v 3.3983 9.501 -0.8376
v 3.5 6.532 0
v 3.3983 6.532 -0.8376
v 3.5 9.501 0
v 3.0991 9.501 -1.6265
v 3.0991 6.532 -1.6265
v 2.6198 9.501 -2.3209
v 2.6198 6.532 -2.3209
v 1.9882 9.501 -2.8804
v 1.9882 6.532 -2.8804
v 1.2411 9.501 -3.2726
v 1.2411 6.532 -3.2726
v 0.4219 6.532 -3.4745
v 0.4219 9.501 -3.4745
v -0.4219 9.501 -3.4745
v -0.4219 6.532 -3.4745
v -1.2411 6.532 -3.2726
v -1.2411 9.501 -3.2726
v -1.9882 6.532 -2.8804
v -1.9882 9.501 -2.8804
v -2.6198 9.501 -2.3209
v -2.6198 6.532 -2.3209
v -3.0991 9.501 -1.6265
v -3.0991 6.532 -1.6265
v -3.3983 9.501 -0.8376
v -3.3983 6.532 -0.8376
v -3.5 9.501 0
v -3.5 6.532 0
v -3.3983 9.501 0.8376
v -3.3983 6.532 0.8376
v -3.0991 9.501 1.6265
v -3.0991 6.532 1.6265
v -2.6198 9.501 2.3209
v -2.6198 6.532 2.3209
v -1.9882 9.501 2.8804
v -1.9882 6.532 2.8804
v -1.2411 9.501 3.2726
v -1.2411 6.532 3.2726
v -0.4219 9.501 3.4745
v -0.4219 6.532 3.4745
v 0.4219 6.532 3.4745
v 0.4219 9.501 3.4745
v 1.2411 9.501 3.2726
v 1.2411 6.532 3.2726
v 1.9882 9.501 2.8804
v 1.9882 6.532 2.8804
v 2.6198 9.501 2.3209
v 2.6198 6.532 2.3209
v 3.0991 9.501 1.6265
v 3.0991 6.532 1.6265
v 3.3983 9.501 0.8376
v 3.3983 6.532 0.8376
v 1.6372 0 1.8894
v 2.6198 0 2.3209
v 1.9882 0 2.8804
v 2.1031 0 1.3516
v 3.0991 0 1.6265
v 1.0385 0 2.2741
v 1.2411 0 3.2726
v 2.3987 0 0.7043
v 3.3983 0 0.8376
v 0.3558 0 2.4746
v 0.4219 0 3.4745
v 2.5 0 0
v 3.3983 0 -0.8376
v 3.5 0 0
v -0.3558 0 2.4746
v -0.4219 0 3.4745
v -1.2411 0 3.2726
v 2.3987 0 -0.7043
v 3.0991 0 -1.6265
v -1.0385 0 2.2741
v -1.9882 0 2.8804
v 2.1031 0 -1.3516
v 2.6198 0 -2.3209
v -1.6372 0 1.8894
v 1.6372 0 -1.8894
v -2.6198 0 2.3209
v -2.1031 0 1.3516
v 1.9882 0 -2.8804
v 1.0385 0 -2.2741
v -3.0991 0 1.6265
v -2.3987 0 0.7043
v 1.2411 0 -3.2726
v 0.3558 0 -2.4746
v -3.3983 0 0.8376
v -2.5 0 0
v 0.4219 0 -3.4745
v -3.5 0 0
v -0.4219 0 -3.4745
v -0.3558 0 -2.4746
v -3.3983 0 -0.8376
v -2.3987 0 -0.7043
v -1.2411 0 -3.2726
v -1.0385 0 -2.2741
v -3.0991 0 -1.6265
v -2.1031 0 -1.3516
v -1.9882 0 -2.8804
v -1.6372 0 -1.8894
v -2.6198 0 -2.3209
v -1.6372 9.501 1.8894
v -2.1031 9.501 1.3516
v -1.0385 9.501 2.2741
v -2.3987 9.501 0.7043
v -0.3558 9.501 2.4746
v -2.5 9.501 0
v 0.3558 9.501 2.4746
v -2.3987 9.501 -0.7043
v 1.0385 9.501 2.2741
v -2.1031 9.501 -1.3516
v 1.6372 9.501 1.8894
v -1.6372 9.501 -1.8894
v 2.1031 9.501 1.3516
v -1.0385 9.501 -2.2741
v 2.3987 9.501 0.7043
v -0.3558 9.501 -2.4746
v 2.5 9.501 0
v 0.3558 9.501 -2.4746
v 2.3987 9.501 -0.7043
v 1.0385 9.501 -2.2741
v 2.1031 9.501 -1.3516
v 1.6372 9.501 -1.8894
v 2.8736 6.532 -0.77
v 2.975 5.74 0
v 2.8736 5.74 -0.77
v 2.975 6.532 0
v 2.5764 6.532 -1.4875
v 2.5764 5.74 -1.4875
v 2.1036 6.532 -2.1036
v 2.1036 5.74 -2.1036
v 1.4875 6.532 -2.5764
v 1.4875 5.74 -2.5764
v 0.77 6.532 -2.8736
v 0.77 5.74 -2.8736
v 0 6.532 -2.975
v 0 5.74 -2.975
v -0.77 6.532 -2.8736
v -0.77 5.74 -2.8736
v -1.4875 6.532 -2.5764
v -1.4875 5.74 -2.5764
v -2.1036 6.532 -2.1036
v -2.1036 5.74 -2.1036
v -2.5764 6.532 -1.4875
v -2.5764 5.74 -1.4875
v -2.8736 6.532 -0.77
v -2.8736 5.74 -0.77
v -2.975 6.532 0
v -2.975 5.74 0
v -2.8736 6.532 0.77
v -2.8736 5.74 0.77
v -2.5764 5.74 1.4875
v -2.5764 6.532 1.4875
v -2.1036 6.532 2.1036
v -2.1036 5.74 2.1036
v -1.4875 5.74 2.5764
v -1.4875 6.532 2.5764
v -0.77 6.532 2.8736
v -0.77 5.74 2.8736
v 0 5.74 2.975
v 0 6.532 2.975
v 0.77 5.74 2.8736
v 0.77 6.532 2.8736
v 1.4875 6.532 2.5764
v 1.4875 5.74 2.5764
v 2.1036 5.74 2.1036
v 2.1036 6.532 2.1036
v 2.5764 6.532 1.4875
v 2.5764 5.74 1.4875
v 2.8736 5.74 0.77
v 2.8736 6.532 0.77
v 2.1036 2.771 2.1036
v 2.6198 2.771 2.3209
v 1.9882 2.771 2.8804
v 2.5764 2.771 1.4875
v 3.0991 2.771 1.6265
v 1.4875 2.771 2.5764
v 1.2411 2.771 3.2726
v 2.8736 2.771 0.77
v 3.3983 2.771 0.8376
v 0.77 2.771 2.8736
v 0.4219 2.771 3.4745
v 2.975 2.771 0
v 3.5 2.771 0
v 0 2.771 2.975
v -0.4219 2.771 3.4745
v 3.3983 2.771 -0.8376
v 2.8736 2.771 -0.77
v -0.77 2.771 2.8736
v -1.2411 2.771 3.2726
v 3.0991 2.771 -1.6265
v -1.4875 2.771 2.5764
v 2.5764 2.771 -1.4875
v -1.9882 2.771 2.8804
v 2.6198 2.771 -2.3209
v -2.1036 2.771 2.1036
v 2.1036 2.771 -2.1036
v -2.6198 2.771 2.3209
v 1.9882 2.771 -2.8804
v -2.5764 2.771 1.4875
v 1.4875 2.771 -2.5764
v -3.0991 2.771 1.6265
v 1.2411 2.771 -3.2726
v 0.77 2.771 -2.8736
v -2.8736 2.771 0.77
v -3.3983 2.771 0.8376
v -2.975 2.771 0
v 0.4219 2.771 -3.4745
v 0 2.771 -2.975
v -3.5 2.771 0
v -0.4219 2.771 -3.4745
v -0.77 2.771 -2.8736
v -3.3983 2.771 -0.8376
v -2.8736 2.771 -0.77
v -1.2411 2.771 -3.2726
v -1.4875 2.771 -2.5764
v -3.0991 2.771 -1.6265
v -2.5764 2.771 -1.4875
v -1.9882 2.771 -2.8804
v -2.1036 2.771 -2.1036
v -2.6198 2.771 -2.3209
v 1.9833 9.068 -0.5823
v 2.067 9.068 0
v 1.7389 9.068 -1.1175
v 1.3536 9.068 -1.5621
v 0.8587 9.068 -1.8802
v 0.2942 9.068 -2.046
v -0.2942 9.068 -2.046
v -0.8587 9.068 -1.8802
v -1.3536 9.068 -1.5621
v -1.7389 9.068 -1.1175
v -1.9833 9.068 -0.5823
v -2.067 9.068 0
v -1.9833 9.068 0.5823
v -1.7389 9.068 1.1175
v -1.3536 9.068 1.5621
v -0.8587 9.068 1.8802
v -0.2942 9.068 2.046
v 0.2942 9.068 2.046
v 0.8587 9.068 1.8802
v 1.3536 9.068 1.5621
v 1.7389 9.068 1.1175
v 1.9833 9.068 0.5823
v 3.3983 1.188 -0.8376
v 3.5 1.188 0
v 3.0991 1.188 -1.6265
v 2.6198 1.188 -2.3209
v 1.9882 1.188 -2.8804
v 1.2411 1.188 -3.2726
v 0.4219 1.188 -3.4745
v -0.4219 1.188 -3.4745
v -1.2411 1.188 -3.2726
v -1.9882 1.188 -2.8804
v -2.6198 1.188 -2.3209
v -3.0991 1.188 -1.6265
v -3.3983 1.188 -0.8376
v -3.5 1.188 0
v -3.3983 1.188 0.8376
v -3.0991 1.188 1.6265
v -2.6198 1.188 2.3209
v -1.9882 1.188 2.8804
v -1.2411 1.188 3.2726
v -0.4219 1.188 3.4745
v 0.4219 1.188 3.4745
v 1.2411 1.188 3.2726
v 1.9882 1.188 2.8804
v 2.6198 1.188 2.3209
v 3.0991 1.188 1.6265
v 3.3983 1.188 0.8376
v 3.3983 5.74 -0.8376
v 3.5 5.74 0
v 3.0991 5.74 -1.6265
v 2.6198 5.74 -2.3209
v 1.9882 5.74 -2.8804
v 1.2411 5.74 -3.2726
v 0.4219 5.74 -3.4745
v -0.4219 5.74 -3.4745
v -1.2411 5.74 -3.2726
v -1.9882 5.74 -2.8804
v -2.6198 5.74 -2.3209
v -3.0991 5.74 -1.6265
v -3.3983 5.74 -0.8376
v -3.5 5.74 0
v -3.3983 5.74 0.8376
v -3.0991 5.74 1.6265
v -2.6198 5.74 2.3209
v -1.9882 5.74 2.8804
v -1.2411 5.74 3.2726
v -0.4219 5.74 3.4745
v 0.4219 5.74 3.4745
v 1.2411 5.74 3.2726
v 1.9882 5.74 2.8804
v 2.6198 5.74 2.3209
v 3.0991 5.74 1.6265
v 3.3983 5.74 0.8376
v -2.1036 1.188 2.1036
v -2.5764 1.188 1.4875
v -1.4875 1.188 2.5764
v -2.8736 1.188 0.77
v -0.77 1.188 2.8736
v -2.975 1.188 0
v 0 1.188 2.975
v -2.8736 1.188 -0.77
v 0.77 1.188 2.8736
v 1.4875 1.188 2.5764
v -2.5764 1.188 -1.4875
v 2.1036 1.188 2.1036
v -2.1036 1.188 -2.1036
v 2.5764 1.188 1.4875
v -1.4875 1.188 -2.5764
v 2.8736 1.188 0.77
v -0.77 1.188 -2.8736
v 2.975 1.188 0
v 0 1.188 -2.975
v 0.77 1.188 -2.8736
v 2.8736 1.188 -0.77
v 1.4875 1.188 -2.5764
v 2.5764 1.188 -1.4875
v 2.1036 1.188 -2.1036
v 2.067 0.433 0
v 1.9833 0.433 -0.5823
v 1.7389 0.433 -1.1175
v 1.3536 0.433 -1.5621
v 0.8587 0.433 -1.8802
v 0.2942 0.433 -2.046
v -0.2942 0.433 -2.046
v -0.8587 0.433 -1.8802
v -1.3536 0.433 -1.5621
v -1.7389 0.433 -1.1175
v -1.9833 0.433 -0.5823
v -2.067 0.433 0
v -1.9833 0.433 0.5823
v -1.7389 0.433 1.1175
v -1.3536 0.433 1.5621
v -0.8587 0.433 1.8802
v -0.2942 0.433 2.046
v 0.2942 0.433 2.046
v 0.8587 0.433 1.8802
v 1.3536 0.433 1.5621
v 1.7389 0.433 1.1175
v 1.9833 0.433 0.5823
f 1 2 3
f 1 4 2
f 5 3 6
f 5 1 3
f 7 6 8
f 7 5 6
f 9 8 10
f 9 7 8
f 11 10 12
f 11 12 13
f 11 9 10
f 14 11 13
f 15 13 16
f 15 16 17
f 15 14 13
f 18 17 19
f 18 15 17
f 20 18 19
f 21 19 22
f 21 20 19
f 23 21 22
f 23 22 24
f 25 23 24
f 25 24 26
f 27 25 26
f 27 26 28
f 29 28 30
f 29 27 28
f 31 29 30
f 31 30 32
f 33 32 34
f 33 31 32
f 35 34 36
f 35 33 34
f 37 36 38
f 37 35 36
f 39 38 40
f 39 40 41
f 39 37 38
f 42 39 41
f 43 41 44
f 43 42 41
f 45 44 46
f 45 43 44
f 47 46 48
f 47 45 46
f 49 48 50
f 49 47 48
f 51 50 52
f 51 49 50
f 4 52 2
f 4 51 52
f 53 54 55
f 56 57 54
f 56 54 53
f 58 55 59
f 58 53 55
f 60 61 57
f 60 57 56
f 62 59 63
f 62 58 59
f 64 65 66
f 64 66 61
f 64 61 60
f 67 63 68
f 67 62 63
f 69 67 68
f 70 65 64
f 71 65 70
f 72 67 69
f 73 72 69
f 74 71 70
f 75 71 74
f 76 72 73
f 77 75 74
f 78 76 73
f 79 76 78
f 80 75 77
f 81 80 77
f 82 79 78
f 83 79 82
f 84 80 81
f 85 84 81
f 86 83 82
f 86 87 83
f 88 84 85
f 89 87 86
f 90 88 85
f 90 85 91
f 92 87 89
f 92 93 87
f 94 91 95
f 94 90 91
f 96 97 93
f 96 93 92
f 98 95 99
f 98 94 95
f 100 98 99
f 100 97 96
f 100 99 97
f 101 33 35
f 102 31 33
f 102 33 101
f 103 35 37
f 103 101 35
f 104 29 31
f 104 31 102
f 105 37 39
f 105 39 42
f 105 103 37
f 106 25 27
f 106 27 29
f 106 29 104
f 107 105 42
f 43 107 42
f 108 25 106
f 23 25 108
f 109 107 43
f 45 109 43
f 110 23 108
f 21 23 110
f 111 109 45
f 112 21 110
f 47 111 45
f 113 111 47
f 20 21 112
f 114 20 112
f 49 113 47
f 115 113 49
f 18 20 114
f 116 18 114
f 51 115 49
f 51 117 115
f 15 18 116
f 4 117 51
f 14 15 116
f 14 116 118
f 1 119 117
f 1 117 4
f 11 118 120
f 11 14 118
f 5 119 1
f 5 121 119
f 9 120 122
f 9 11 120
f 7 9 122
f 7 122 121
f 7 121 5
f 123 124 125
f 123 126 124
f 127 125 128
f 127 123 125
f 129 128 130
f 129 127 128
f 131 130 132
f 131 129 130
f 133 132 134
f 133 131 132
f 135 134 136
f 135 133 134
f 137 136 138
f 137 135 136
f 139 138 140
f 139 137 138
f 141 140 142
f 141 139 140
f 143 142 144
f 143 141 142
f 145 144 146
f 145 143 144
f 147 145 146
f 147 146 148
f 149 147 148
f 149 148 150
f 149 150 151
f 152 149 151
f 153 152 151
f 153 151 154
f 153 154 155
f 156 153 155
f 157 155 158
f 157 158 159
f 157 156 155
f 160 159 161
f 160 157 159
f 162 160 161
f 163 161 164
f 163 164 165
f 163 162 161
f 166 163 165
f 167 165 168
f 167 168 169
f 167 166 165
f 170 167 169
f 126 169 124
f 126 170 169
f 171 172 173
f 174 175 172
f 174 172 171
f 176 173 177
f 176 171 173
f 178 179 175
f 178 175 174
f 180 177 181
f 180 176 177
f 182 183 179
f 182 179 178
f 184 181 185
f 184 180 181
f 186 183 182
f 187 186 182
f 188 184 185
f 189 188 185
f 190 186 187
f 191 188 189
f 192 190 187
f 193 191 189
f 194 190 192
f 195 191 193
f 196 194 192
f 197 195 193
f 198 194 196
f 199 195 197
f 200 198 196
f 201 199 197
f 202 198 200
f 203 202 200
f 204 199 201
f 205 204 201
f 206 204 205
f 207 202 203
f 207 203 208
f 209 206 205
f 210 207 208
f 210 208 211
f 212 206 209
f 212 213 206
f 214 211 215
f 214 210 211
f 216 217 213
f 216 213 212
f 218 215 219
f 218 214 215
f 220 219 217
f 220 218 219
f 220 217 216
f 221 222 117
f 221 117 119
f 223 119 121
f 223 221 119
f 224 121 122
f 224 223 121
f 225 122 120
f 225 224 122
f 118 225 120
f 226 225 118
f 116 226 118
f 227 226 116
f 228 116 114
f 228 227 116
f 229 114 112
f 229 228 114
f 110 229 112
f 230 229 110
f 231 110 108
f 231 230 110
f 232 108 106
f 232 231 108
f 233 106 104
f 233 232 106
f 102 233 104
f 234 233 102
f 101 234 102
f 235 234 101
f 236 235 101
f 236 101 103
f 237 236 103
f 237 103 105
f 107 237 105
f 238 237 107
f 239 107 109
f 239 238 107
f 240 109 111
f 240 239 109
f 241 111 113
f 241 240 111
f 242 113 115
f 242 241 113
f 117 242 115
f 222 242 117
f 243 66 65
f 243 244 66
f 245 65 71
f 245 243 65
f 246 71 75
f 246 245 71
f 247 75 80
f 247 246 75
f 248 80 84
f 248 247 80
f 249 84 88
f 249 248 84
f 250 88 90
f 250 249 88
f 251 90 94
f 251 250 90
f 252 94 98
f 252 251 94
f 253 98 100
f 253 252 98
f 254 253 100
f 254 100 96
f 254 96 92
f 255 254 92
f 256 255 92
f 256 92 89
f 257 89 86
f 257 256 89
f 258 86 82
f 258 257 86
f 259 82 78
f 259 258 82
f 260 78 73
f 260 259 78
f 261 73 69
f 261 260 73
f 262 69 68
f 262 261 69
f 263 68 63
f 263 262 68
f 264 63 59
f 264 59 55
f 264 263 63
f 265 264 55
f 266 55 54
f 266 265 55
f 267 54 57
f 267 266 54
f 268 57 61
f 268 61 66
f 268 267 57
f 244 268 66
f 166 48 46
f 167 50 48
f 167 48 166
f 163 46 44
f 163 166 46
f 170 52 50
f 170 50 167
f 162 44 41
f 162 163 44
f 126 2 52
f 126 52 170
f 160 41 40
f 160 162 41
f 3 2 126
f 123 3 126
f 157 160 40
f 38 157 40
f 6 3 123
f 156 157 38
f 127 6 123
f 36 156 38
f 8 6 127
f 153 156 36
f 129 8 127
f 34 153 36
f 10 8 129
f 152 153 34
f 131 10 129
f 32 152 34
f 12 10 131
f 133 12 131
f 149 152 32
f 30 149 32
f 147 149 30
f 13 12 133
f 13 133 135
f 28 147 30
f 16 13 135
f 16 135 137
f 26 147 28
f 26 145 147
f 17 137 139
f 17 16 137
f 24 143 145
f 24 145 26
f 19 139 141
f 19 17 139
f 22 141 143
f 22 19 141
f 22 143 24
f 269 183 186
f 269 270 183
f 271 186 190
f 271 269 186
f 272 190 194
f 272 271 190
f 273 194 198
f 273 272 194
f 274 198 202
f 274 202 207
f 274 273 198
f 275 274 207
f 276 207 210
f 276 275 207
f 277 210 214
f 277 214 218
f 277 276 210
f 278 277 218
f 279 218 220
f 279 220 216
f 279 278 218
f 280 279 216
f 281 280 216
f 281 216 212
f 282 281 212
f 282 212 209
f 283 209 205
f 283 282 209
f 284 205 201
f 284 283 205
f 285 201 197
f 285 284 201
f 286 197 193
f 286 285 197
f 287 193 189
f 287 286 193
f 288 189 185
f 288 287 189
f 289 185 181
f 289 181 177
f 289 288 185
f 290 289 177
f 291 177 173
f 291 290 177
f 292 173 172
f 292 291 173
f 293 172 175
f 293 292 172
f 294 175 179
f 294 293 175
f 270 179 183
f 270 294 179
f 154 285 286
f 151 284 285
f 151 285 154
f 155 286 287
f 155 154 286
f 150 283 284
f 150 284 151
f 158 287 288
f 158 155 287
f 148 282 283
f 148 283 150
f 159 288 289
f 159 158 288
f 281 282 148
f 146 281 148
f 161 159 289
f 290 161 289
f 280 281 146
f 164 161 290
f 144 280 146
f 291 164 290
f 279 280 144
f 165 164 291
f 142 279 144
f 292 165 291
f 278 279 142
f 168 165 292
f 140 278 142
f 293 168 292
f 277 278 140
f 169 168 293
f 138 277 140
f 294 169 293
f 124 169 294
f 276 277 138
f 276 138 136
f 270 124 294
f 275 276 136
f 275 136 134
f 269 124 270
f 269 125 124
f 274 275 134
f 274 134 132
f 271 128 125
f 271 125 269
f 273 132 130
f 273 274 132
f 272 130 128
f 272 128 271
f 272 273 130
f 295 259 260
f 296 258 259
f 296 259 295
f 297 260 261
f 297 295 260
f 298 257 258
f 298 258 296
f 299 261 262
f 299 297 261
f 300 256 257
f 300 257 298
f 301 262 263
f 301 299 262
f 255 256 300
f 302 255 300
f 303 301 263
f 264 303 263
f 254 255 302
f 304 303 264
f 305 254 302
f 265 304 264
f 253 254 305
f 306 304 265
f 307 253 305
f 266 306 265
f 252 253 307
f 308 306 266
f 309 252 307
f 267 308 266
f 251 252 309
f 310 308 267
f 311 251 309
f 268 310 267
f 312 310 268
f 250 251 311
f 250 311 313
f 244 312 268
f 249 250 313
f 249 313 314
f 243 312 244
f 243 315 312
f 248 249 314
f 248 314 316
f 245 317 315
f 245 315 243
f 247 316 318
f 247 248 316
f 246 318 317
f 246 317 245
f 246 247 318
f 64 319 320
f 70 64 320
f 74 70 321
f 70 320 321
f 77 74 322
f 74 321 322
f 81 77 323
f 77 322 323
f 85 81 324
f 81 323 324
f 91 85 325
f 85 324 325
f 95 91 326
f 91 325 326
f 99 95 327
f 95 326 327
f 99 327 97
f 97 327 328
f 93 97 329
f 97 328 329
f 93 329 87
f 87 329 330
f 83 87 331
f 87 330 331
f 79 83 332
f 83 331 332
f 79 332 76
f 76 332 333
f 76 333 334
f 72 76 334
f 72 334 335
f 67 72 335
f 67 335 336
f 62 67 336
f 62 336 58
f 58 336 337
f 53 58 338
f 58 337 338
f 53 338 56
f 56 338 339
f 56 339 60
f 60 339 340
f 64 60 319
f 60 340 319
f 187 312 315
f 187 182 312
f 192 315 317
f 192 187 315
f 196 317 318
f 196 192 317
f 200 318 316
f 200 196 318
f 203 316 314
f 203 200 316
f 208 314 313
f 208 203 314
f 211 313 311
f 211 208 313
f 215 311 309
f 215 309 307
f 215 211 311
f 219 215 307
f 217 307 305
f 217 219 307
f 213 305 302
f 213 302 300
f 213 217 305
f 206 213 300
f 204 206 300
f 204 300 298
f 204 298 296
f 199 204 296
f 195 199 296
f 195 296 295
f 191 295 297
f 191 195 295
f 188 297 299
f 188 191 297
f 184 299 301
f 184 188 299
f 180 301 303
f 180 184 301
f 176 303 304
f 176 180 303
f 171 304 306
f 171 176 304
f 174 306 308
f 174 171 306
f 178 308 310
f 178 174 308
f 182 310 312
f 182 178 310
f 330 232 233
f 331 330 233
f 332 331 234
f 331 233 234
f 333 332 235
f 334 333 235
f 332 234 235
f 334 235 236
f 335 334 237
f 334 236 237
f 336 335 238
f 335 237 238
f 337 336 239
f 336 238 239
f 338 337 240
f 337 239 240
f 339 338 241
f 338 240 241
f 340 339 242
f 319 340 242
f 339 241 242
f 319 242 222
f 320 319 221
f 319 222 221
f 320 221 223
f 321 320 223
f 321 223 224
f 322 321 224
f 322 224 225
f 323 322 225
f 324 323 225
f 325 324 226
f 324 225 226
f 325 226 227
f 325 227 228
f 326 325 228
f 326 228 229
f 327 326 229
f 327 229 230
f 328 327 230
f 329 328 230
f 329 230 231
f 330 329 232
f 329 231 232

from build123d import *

# Parameters (mm, degrees)
CUT_EXTRUDE1_REACH = 12.713
SKETCH3_R          = 2.067


with BuildPart() as part:
    # Sketch2 → Revolve1 (revolve)
    with BuildSketch(Plane.XY):
        Polygon((0, 0), (3.5, 0), (3.5, 1.188), (2.975, 1.188), (2.975, 2.771), (3.5, 2.771), (3.5, 5.74), (2.975, 5.74), (2.975, 6.532), (3.5, 6.532), (3.5, 9.501), (0, 9.501), align=None)
    revolve(axis=Axis((0, -157.439431358, 0), (0, 1, 0)))

    # Sketch3 → Cut-Extrude1 (cut, up to next)
    with BuildSketch(Plane(origin=(0, 9.501, 0), x_dir=(1, 0, 0), z_dir=(0, 1, 0)), mode=Mode.PRIVATE) as cut_extrude1_sk1:
        with Locations(Location((0, 0, 0), (0, 0, 180))):
            Circle(SKETCH3_R)
    cut_extrude1_tool1 = extrude(cut_extrude1_sk1.sketch, amount=-CUT_EXTRUDE1_REACH, mode=Mode.PRIVATE) & part.part
    add(cut_extrude1_tool1.solids().sort_by_distance((0, 9.501, 0))[0], mode=Mode.SUBTRACT)

    # Sketch14 → Cut-Revolve1 (revolve, cut)
    with BuildSketch(Plane.XY, mode=Mode.PRIVATE) as cut_revolve1_sk:
        Polygon((-2.5, 9.501), (-2.067, 9.068), (-2.067, 9.501), align=None)
        Polygon((-2.5, 0), (-2.067, 0.433), (-2.067, 0), align=None)
    revolve(cut_revolve1_sk.sketch.rotate(Axis((0, -1000, 0), (0, 1, 0)), 180), axis=Axis((0, -1000, 0), (0, 1, 0)), mode=Mode.SUBTRACT)


solid = part.part
